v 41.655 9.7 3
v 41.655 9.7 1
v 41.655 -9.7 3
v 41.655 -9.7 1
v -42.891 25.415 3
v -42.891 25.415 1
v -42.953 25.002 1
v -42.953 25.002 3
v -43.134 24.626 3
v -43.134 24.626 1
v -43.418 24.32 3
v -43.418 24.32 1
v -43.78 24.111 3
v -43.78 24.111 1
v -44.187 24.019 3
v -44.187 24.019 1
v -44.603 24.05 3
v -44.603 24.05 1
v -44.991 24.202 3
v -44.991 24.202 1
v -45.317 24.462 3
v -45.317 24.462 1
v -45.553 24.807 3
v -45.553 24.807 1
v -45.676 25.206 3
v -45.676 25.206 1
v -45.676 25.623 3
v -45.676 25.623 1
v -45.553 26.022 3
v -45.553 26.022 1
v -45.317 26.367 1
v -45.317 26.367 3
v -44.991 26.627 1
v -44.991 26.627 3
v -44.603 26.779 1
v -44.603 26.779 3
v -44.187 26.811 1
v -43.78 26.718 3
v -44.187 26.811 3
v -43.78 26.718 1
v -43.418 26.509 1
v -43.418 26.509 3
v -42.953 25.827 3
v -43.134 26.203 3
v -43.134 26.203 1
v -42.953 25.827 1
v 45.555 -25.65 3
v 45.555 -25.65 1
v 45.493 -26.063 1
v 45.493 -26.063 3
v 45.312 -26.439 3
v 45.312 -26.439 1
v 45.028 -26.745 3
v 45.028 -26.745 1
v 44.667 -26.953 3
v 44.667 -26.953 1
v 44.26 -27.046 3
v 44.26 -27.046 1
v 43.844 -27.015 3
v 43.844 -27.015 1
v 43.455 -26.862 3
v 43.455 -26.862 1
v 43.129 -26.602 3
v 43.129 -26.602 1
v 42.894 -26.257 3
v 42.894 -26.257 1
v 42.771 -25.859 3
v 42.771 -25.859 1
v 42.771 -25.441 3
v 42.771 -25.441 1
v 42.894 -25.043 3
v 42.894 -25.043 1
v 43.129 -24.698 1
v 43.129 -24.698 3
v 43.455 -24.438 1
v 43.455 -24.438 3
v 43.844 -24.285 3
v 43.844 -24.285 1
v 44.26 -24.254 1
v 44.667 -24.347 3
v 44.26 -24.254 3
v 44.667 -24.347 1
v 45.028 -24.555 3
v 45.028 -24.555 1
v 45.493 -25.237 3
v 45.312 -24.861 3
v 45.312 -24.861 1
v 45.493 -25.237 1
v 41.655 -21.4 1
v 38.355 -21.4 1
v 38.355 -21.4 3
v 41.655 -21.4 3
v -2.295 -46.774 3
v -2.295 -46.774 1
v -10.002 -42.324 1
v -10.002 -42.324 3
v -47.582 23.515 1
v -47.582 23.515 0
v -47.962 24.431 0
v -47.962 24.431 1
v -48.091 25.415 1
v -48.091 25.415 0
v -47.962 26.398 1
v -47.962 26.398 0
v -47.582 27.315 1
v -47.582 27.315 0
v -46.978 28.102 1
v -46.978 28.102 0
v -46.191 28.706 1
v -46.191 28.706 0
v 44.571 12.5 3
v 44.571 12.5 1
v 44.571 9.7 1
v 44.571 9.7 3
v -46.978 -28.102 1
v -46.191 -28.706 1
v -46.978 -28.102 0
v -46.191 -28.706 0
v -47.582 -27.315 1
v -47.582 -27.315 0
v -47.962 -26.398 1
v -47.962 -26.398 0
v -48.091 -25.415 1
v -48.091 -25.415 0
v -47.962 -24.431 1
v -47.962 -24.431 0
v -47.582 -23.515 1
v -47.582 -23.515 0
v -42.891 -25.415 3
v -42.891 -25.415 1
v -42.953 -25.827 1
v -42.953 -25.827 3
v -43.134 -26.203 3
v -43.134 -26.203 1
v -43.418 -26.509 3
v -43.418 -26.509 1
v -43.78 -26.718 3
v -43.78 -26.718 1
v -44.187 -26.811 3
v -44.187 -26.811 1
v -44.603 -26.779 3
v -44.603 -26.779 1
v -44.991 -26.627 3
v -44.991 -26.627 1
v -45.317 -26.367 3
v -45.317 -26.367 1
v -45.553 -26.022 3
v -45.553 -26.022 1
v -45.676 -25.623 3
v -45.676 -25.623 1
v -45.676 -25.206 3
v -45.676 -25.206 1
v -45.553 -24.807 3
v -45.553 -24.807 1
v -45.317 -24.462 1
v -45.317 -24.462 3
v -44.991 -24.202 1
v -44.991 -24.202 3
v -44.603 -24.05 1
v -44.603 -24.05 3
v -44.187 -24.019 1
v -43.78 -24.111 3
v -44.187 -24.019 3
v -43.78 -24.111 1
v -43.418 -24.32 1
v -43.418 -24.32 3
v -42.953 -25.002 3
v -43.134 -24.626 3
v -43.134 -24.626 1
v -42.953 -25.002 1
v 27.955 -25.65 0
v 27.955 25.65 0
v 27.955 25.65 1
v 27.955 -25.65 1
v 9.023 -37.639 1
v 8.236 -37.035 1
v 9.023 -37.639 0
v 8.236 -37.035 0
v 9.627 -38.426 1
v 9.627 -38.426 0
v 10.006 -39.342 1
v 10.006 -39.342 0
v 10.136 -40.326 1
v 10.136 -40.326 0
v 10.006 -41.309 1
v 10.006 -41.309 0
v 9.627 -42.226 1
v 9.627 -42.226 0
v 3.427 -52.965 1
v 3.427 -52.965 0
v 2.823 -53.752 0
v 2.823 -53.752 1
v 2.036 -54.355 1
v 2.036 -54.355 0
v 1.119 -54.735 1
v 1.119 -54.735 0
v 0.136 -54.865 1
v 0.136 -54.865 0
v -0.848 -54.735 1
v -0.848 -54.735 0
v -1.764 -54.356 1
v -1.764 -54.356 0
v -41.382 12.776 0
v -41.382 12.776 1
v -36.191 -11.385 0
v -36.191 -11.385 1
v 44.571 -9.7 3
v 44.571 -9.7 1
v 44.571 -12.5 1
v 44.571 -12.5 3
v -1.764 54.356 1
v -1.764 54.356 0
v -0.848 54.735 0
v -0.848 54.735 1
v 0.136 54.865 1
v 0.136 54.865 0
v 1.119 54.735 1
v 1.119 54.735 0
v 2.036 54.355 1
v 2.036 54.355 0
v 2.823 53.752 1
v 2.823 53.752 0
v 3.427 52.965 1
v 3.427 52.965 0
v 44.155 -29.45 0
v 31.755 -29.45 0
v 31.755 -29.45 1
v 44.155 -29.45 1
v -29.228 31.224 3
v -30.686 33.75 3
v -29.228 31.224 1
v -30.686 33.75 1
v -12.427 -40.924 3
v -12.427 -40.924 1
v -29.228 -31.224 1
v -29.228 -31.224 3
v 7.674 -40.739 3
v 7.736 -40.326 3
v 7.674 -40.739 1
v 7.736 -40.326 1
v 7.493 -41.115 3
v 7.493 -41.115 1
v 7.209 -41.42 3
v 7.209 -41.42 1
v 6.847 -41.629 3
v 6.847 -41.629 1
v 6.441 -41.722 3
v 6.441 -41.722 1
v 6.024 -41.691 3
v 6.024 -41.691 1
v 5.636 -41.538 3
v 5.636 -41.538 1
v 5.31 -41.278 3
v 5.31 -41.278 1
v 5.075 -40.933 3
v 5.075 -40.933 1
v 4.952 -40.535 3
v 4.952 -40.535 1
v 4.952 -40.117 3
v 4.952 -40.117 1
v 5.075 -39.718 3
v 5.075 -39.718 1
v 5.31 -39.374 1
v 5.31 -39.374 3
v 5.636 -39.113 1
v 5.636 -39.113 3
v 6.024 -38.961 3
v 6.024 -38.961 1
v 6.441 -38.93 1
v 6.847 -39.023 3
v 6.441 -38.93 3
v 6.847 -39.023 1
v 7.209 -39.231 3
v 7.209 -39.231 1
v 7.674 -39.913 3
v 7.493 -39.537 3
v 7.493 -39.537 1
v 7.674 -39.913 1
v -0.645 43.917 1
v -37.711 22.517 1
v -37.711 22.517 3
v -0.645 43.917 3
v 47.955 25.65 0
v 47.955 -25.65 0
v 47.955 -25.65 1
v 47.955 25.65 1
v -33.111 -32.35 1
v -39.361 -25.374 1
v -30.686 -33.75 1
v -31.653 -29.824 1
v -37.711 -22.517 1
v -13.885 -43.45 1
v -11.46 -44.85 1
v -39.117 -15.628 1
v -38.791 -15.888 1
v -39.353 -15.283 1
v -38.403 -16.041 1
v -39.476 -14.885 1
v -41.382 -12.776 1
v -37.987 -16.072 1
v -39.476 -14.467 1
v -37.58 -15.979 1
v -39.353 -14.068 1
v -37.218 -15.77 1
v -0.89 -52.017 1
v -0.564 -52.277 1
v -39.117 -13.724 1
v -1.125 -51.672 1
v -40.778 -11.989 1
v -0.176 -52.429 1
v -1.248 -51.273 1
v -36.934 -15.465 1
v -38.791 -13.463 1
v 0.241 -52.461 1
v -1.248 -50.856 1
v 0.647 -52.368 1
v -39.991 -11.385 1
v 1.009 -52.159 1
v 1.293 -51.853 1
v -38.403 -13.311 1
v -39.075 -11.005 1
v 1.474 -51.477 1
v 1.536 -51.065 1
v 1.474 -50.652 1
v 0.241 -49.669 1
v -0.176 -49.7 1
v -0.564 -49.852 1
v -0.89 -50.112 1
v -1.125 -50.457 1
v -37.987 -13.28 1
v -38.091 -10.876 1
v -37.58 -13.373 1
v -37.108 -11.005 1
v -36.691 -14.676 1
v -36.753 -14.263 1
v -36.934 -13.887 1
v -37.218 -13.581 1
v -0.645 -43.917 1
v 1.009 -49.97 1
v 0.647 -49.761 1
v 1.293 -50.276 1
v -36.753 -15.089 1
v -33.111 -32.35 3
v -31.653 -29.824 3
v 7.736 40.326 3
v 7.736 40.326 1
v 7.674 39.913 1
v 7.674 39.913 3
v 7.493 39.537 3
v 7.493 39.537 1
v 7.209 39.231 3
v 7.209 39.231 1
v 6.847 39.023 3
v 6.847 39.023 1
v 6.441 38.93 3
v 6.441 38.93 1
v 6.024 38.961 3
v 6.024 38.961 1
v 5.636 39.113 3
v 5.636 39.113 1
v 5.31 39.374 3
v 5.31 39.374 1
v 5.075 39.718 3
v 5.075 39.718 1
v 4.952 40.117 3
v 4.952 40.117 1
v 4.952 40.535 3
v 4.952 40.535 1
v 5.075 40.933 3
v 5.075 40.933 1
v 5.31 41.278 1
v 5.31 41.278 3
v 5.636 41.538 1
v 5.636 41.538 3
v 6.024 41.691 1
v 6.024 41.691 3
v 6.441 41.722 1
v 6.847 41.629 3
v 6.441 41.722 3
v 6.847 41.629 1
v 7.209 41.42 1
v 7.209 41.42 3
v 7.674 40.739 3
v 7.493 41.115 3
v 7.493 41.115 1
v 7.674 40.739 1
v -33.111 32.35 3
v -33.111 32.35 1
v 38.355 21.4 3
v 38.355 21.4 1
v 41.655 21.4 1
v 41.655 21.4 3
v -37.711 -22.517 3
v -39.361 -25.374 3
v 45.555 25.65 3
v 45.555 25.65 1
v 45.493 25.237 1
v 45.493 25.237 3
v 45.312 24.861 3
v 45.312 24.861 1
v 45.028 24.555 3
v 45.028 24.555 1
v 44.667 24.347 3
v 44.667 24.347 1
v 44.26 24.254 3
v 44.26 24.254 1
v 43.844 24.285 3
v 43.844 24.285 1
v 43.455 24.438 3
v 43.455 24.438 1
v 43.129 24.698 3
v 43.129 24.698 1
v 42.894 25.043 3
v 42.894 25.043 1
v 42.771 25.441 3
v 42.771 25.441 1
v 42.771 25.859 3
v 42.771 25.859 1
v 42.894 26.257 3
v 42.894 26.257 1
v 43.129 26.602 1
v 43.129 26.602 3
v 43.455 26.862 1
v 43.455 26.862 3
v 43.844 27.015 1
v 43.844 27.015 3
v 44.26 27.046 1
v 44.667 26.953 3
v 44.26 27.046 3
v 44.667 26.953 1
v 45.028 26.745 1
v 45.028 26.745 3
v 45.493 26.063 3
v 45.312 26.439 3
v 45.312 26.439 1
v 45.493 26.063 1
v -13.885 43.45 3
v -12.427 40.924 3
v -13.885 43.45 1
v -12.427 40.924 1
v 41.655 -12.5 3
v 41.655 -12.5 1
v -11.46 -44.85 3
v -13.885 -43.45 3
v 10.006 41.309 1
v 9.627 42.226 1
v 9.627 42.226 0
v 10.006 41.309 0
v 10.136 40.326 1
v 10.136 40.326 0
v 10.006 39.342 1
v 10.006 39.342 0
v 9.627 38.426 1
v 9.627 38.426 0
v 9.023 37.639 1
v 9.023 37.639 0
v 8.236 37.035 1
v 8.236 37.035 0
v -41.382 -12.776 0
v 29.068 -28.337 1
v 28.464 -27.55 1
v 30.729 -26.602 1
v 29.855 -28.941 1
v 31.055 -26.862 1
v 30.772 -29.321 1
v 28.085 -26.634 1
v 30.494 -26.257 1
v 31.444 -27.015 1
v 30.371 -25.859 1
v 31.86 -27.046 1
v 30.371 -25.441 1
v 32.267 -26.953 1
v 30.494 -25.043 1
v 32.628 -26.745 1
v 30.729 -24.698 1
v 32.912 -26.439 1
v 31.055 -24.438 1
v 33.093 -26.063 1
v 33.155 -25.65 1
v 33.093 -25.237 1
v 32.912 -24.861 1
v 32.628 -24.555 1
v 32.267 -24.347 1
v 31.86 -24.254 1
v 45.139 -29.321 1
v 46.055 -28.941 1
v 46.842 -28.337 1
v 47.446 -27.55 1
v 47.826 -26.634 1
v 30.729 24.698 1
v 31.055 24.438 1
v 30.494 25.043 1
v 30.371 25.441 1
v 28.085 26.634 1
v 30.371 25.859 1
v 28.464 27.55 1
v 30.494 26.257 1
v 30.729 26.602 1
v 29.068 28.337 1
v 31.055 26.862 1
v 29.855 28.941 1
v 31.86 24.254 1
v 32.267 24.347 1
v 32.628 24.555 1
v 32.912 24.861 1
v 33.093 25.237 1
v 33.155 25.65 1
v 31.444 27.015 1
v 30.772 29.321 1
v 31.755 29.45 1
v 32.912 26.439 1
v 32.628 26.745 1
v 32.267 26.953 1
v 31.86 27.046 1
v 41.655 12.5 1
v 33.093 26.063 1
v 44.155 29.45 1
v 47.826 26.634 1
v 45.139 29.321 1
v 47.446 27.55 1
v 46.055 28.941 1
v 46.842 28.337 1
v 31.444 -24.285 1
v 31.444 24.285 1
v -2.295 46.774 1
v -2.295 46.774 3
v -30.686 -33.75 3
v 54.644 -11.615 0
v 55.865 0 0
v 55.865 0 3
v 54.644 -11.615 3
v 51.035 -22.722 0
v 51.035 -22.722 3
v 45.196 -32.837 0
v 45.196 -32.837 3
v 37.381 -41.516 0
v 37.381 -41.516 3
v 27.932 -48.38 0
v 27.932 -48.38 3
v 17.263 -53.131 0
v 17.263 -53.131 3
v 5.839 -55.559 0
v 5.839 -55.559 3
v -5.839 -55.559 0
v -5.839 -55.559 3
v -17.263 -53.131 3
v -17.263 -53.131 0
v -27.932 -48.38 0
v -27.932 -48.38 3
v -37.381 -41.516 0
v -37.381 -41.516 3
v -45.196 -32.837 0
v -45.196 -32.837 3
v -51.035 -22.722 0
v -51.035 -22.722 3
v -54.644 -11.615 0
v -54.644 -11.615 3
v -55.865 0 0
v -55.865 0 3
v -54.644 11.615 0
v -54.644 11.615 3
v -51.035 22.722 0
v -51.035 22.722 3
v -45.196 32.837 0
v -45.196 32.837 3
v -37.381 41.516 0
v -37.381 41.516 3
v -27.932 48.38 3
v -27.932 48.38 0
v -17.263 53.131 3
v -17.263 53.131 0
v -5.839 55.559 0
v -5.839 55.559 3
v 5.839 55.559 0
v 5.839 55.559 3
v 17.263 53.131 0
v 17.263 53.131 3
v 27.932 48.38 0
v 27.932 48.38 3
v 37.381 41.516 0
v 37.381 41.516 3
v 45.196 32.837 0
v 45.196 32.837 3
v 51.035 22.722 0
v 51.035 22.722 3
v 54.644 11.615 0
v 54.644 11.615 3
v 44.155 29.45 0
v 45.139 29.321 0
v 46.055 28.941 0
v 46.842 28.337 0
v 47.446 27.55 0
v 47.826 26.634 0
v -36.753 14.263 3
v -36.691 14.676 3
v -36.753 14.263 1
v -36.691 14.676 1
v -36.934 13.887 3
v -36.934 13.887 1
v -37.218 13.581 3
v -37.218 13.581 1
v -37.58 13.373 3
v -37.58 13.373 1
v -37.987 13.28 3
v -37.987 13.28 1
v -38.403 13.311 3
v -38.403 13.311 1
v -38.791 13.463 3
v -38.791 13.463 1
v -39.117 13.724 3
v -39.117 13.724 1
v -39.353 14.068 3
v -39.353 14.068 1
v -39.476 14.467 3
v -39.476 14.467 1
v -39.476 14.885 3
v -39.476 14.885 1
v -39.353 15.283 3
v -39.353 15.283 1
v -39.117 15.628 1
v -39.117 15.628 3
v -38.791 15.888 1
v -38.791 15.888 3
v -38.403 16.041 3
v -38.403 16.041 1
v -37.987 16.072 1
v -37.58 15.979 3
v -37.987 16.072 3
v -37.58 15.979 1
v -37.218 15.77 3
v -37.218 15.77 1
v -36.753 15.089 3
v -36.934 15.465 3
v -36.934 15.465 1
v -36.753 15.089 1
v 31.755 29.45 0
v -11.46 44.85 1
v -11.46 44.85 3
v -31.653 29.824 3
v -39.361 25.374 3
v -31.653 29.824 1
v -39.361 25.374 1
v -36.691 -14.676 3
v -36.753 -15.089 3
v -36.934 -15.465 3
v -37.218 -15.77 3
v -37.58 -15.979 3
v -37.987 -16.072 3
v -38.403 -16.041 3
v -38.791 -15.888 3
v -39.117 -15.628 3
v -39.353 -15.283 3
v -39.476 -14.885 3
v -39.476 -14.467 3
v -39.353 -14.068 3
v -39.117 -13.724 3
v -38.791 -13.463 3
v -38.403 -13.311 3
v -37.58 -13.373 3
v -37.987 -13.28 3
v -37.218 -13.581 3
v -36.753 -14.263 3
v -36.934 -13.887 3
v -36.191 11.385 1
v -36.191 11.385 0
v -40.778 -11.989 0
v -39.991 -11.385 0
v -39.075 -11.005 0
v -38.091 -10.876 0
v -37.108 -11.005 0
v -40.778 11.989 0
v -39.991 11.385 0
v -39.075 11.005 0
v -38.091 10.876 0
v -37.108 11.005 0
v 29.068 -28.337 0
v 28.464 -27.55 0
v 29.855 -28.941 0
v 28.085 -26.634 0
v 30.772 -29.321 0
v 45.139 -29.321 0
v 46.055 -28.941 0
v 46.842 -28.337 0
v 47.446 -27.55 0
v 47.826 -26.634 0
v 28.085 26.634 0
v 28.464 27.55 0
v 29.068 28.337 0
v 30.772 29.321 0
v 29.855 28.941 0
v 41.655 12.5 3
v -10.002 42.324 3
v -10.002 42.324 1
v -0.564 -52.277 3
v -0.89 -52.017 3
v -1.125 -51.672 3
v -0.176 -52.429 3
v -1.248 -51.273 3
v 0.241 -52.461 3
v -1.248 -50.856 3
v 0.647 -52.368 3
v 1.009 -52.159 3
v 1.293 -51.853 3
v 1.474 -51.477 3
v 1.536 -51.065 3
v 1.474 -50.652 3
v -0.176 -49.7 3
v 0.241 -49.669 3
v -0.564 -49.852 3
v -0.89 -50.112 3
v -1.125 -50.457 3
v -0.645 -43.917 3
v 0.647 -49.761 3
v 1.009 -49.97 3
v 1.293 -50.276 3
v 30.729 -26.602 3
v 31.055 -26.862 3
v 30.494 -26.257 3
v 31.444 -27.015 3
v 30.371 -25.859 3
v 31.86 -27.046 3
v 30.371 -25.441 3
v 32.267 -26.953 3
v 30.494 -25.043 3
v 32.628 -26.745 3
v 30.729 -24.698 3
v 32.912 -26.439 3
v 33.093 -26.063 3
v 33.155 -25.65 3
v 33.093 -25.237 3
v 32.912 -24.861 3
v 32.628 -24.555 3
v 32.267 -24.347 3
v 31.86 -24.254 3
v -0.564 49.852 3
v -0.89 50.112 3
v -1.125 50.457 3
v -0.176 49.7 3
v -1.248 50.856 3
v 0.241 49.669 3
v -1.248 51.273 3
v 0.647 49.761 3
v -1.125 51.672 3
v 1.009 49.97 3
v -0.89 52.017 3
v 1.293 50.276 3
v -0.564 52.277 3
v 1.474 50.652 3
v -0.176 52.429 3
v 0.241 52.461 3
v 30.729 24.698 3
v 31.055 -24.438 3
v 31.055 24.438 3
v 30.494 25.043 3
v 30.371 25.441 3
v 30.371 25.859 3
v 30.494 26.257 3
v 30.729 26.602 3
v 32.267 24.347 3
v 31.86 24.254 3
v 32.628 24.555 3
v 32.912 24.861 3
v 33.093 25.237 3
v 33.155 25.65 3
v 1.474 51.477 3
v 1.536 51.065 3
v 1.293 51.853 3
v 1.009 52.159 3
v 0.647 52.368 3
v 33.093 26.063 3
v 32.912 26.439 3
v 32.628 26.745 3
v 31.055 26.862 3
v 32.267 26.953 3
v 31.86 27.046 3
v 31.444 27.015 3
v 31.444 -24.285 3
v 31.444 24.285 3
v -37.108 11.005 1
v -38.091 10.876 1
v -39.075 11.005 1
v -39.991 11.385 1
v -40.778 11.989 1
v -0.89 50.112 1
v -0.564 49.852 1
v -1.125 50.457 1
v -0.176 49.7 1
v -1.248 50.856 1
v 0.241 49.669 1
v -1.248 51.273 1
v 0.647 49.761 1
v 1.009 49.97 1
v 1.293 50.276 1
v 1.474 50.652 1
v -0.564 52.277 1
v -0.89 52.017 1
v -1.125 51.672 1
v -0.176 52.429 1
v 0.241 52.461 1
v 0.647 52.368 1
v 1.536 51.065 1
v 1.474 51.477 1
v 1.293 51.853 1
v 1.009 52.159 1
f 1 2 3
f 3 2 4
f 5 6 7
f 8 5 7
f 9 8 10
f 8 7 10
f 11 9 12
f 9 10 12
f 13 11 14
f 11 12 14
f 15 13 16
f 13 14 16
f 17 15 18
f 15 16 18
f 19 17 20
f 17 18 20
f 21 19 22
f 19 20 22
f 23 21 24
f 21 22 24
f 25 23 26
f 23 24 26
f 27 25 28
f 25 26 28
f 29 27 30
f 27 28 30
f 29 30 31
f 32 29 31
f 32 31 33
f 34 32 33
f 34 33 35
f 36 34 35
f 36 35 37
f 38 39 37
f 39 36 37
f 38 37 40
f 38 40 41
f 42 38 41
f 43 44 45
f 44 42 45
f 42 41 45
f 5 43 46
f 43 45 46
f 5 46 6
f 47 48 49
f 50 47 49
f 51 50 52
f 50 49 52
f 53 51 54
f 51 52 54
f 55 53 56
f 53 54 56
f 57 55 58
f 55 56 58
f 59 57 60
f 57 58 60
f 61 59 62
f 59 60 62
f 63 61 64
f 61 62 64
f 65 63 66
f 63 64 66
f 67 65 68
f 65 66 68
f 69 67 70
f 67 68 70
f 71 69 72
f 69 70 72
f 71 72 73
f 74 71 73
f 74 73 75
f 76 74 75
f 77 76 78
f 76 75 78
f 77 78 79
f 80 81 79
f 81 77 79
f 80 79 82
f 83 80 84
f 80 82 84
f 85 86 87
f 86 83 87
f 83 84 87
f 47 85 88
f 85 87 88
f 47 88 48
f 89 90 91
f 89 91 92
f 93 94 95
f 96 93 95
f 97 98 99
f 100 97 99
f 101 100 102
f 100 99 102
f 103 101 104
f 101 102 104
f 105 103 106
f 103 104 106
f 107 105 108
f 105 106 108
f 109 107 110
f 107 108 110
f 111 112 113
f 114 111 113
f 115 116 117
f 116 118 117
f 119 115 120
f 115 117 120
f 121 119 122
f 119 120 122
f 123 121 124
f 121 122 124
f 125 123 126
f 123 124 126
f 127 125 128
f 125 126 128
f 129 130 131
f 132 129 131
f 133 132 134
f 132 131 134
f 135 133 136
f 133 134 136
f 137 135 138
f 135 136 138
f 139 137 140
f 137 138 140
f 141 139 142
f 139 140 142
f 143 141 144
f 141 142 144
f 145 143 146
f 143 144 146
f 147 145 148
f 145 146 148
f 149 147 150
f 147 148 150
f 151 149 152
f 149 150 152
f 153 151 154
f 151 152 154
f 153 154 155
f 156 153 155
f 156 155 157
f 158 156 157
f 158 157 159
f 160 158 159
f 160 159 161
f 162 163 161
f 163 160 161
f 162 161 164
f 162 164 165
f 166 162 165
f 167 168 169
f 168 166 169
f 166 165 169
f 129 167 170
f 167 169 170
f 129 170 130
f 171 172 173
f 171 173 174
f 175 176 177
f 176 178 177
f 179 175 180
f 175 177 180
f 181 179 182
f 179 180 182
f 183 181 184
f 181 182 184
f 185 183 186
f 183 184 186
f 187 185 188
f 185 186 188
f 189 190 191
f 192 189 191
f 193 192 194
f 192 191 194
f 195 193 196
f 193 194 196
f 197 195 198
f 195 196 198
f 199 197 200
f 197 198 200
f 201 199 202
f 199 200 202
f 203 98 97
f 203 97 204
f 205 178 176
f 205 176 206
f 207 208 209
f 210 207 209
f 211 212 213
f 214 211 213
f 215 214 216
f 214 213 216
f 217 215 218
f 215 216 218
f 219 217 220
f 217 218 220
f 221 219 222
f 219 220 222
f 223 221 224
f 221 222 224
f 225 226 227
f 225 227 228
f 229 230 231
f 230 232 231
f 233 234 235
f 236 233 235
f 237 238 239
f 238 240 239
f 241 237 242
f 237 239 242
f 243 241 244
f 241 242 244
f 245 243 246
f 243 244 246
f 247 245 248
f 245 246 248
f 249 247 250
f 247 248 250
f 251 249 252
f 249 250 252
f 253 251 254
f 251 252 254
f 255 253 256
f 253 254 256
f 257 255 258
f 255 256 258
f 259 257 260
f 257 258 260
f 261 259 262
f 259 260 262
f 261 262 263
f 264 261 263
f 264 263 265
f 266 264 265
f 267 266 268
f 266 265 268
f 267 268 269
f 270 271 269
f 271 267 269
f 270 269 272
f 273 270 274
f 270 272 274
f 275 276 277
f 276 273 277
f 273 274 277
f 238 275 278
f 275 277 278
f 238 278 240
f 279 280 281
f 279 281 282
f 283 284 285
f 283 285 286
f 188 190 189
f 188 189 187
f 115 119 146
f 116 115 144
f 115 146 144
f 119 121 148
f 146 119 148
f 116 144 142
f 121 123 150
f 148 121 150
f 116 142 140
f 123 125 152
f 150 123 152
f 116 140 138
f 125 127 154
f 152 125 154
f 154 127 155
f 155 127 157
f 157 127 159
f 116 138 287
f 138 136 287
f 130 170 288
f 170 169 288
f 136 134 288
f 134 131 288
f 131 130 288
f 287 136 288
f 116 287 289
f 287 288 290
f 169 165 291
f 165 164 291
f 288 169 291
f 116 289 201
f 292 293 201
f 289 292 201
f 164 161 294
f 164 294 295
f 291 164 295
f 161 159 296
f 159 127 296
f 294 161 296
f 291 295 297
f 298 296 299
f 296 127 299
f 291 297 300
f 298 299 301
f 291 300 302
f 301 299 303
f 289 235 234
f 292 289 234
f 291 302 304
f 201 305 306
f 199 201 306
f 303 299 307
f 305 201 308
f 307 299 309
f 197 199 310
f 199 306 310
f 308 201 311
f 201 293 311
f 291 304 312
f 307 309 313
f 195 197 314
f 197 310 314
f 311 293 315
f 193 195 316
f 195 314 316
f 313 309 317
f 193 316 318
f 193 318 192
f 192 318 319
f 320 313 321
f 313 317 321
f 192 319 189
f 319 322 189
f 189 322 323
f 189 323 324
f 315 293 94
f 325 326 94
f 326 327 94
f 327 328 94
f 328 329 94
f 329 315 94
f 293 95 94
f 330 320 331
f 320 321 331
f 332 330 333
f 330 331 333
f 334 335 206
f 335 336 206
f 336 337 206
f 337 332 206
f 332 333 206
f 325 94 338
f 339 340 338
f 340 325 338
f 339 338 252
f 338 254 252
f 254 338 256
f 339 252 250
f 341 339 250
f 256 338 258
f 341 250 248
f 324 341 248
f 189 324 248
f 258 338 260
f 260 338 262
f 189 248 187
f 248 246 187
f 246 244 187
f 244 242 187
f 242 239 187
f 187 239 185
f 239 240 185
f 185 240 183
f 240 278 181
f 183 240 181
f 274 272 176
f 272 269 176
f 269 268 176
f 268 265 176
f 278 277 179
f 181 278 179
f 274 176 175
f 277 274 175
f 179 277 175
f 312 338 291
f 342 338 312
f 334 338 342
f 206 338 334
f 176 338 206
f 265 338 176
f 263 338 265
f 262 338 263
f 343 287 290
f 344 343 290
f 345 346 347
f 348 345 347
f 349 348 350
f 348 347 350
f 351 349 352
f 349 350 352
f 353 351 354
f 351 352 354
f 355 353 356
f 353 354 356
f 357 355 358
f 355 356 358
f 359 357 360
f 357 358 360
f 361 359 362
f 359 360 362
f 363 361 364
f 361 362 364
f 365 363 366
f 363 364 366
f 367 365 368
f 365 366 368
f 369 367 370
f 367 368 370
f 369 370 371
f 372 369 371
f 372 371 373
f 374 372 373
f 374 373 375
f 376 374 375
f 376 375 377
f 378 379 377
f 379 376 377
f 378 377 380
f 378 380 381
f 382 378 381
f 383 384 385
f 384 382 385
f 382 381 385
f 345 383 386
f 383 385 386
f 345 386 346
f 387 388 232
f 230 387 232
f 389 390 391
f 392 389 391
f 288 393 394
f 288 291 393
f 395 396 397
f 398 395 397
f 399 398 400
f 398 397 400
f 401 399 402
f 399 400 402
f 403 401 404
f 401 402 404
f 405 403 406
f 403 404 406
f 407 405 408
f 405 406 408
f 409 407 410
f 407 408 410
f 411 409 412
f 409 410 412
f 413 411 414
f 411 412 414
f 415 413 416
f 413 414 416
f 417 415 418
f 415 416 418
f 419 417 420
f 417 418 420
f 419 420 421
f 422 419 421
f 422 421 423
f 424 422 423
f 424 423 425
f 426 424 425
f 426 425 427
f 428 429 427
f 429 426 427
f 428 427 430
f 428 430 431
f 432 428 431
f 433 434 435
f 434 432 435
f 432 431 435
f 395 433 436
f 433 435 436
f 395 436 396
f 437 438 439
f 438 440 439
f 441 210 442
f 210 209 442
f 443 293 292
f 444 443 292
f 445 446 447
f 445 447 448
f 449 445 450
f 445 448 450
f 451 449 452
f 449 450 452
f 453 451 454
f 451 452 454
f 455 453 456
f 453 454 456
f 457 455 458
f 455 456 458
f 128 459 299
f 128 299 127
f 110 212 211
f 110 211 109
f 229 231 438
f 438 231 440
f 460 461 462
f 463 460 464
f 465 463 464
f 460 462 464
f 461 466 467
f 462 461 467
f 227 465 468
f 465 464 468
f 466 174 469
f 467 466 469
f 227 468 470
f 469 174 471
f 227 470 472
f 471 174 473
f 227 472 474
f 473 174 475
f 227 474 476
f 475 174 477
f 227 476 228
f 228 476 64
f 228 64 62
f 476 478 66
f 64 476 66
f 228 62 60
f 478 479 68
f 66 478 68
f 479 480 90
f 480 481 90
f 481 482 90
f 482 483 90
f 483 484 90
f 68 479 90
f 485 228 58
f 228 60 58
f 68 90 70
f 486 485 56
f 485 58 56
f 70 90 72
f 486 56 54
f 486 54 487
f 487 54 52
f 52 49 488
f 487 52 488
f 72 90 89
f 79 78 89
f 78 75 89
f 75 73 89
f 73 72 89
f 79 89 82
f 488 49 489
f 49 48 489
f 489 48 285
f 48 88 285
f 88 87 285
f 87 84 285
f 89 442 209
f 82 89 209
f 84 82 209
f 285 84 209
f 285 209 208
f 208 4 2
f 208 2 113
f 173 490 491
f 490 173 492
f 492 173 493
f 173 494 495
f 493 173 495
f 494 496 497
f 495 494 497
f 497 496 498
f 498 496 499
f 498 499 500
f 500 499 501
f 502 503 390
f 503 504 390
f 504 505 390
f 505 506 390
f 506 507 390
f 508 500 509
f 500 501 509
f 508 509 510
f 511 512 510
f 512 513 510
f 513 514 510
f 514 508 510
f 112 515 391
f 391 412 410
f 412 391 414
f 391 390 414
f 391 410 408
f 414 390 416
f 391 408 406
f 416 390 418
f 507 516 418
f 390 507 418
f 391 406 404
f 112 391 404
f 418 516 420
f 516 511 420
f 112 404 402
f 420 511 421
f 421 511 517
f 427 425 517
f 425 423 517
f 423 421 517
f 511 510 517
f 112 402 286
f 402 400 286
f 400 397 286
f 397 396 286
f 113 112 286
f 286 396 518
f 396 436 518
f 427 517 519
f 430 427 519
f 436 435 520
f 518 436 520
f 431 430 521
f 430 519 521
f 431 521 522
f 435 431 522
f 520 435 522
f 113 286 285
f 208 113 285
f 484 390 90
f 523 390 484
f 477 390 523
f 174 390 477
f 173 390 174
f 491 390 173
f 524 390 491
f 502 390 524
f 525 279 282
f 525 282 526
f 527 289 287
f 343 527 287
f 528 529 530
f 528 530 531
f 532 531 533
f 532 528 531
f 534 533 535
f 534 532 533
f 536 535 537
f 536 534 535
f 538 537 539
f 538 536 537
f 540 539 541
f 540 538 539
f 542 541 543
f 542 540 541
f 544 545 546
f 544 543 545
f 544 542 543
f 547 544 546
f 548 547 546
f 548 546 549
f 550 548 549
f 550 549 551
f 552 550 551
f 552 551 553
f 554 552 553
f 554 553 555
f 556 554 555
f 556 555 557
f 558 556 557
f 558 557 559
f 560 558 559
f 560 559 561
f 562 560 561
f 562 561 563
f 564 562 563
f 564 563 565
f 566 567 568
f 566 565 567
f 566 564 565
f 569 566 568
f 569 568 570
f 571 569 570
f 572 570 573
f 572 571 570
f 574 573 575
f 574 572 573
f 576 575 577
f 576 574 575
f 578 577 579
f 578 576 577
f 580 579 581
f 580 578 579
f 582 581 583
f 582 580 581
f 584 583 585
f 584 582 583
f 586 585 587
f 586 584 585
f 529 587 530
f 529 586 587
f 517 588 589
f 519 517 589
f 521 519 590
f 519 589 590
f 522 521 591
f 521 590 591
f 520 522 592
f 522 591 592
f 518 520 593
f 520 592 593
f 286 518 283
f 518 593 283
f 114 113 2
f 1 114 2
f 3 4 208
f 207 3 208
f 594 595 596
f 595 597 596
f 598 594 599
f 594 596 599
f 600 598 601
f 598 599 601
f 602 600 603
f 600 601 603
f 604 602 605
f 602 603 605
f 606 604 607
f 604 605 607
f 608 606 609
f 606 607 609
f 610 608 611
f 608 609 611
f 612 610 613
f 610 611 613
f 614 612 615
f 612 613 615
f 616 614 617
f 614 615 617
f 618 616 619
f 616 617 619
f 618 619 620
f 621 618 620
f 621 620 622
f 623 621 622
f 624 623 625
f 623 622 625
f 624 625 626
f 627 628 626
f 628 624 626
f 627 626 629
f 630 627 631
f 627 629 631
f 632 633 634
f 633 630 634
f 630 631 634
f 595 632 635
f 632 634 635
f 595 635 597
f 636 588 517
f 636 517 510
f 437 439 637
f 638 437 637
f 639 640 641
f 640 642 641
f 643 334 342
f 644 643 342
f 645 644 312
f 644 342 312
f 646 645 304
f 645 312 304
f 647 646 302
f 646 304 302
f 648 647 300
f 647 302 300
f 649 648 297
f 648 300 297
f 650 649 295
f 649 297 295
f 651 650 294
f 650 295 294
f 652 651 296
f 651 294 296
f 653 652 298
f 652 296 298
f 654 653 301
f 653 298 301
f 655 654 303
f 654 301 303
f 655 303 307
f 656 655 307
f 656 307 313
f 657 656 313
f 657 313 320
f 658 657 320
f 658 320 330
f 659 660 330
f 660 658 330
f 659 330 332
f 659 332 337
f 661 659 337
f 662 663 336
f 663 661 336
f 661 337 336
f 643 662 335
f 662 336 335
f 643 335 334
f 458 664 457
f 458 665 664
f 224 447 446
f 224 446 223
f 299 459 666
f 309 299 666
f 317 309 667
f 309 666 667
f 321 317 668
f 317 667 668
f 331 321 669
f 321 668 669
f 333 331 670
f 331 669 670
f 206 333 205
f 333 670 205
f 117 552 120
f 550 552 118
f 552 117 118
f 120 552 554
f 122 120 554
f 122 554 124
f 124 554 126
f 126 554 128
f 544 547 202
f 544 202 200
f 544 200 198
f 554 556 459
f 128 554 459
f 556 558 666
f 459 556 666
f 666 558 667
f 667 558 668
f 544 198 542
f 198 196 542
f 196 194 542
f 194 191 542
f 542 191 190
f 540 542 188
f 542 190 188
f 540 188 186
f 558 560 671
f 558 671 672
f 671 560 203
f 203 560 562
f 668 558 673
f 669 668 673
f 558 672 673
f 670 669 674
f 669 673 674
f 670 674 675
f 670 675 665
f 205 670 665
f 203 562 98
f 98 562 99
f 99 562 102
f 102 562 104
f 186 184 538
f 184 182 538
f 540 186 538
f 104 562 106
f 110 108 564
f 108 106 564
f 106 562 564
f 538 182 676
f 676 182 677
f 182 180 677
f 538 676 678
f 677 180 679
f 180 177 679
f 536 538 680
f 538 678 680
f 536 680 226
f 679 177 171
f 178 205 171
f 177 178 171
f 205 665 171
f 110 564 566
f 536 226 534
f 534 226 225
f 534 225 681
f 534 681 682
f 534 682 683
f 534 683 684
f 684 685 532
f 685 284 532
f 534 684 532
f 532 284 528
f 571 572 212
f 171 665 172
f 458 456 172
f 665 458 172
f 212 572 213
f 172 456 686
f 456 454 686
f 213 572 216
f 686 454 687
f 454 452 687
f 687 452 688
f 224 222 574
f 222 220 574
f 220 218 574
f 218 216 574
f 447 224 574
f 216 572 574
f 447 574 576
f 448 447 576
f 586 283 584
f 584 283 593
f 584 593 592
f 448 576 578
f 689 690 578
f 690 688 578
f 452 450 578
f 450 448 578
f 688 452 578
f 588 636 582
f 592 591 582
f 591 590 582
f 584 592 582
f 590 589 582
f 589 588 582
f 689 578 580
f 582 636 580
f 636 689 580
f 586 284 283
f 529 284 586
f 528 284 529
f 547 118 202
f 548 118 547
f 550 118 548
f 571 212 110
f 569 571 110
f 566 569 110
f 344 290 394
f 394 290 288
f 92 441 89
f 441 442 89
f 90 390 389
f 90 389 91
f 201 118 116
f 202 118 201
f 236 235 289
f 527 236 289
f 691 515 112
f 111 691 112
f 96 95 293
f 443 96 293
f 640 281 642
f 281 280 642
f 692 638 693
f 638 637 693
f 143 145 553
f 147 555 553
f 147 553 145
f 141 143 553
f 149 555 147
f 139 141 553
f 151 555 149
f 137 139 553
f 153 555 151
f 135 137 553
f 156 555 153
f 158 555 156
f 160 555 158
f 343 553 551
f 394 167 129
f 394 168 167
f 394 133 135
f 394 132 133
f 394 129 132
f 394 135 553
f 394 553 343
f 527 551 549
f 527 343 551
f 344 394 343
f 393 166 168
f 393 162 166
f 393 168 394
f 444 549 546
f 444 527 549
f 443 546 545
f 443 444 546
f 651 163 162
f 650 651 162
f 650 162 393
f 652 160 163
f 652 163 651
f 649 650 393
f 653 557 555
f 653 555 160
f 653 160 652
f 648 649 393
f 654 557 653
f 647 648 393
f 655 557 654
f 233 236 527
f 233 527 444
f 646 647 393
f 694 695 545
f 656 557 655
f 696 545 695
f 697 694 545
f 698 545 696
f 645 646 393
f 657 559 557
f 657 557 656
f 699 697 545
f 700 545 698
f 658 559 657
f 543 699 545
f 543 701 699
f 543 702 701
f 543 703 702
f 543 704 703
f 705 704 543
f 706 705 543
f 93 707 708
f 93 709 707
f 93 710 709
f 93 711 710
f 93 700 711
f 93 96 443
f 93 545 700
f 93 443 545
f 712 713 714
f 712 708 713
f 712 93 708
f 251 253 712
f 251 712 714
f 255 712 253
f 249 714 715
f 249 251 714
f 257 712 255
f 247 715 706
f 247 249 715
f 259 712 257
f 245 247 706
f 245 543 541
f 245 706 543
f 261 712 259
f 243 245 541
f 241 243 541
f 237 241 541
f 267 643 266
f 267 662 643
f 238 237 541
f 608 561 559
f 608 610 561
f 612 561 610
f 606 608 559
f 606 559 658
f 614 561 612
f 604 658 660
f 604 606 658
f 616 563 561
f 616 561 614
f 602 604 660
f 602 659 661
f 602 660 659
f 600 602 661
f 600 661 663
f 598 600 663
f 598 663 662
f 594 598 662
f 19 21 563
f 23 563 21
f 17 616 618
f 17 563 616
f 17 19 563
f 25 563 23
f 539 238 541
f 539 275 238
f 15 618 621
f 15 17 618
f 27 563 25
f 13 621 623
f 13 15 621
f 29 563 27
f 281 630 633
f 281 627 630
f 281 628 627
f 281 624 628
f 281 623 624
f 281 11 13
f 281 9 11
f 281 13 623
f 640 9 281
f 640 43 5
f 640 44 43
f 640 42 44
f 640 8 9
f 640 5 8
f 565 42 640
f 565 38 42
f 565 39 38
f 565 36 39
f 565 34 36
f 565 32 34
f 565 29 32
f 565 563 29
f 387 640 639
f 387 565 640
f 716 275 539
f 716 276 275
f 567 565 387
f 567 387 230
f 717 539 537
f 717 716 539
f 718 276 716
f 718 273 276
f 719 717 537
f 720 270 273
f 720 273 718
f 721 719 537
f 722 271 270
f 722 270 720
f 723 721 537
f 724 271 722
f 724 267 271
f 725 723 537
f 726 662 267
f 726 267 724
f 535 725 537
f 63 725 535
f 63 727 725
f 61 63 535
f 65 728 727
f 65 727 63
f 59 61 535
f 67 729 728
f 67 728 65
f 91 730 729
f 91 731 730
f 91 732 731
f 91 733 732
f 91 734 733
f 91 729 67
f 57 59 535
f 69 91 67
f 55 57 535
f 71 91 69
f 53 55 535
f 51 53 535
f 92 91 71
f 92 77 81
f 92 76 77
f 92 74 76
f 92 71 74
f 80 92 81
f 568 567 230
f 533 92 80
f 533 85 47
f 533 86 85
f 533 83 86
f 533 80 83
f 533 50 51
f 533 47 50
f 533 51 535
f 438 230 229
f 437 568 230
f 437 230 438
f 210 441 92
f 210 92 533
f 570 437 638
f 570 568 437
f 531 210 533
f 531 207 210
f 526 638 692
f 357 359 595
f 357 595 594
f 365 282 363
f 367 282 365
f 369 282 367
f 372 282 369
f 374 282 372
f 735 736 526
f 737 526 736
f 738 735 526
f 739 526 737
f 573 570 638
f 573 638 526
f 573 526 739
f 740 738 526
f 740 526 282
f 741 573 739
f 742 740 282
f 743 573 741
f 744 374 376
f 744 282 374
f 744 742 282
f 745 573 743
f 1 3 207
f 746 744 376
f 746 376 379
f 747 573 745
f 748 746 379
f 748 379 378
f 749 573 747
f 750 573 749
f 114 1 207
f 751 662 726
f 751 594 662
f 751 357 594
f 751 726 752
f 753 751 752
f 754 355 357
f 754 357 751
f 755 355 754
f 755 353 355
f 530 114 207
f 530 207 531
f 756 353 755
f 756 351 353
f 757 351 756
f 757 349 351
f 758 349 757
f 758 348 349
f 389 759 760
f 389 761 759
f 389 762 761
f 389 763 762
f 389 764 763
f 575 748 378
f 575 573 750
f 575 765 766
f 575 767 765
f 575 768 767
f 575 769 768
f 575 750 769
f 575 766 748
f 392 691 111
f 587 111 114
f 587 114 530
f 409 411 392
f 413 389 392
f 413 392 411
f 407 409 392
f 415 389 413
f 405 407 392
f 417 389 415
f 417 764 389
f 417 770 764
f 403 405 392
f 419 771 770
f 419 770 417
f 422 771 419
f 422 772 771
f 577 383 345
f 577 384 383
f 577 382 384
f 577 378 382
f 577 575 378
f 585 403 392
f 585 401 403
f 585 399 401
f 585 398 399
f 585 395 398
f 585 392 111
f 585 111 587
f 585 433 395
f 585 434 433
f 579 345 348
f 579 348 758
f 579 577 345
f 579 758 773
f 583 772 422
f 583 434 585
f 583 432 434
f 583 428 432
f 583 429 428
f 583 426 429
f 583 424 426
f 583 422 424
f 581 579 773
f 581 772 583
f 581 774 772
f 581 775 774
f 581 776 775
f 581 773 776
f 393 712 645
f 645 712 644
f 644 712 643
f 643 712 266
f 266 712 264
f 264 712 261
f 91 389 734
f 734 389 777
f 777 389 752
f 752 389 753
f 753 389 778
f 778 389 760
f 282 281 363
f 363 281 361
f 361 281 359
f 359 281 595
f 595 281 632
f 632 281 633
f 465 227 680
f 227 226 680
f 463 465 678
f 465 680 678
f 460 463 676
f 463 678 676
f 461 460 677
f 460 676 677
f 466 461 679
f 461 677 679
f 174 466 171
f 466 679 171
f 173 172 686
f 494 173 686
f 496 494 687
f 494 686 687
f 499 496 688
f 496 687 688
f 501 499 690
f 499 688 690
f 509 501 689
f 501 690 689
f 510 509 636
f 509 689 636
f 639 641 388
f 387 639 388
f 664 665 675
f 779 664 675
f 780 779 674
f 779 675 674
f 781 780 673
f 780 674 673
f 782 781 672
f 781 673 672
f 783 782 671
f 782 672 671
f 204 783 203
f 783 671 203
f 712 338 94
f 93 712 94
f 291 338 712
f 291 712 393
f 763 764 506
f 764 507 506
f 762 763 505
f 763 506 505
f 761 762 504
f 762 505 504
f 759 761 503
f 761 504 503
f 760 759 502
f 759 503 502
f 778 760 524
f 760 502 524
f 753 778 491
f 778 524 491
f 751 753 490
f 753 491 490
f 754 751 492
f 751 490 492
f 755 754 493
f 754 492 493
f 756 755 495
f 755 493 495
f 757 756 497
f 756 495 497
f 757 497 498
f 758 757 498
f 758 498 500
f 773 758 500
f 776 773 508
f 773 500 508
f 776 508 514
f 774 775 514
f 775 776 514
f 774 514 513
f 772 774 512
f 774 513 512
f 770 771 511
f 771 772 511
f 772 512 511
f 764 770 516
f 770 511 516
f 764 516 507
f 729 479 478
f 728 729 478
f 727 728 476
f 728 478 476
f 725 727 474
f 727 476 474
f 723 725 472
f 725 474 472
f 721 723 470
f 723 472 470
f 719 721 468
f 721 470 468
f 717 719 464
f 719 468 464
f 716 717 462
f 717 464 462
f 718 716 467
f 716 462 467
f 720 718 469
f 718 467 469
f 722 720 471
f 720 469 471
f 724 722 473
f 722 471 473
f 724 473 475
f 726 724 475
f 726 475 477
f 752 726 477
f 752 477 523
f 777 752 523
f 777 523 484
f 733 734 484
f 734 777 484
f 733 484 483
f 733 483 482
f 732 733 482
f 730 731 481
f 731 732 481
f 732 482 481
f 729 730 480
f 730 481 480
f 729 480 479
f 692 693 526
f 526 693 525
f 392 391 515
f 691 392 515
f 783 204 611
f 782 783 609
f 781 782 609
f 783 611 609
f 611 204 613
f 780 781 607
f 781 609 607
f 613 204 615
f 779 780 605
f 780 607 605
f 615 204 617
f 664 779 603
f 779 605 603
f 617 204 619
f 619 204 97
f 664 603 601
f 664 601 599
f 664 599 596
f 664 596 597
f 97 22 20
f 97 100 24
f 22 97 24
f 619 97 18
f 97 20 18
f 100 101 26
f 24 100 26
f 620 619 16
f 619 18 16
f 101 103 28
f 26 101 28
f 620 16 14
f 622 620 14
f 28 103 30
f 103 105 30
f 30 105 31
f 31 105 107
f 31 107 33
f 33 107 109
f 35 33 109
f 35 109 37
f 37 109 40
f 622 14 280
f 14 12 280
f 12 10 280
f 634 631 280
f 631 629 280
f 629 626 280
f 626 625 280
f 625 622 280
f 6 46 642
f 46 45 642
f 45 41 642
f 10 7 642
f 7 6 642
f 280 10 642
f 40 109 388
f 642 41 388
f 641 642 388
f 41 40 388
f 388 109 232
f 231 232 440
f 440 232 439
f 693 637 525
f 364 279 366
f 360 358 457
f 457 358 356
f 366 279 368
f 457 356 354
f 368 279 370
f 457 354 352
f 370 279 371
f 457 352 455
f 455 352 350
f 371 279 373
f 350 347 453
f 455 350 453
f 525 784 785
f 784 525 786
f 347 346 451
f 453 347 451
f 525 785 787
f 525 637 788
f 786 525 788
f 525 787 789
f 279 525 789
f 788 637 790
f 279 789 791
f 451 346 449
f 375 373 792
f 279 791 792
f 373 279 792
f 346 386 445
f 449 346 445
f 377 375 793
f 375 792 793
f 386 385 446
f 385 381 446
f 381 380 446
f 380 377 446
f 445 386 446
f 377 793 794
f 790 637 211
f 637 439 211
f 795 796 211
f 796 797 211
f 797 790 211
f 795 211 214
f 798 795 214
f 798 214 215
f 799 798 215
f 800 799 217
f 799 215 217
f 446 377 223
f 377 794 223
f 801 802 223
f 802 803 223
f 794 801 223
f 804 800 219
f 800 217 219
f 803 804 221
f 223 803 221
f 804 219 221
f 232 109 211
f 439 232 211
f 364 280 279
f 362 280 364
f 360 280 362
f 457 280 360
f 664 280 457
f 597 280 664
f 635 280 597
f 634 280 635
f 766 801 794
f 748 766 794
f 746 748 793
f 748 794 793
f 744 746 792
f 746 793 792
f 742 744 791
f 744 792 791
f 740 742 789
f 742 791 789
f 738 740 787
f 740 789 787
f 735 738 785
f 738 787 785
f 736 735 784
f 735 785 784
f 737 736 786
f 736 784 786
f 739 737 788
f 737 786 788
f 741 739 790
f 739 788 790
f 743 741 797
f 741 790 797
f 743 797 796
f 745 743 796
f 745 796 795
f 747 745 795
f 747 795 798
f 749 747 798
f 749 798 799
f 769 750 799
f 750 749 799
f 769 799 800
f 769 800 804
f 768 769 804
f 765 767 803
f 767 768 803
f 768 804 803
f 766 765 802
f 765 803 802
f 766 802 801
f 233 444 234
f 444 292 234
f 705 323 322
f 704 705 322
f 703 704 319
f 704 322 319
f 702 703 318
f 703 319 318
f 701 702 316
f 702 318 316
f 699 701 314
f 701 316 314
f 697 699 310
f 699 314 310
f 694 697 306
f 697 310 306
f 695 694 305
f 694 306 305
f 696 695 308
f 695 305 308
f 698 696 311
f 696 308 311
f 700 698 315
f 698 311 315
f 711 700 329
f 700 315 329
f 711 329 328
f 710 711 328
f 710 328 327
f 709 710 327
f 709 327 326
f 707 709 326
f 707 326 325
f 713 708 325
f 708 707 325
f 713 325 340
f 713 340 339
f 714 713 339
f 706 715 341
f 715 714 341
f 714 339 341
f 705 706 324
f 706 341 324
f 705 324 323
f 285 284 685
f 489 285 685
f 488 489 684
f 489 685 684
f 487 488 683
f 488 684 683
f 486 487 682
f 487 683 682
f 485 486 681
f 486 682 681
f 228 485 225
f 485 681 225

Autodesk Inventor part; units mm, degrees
ref_plane "YZ Plane" through (0, 0, 0) normal (1, 0, 0) x (0, 1, 0)
ref_plane "XZ Plane" through (0, 0, 0) normal (0, 1, 0) x (-1, 0, 0)
ref_plane "XY Plane" through (0, 0, 0) normal (0, 0, 1) x (1, 0, 0)
sketch "Skizze1" plane through (0, 0, 0) normal (0, 0, 1) x (1, 0, 0)
  line L0 (0, 78.2107) -> (0, -78.2107) construction
  line L1 (-128.6657, 0) -> (86.6199, 0) construction
  line L2 (31.7553, 29.05) -> (44.1553, 29.05) construction
  line L3 (47.5553, 25.65) -> (47.5553, -25.65) construction
  line L4 (44.1553, -29.05) -> (31.7553, -29.05) construction
  line L5 (28.3553, -25.65) -> (28.3553, 25.65) construction
  arc A0 (31.7553, 29.05) -> (28.3553, 25.65) centre (31.7553, 25.65) ccw construction
  arc A1 (47.5553, 25.65) -> (44.1553, 29.05) centre (44.1553, 25.65) ccw construction
  arc A2 (44.1553, -29.05) -> (47.5553, -25.65) centre (44.1553, -25.65) ccw construction
  arc A3 (28.3553, -25.65) -> (31.7553, -29.05) centre (31.7553, -25.65) ccw construction
  circle A4 centre (31.7553, 25.65) radius 1.4
  circle A5 centre (44.1553, 25.65) radius 1.4
  circle A6 centre (31.7553, -25.65) radius 1.4
  circle A7 centre (44.1553, -25.65) radius 1.4
  line L6 (41.6553, 21.4) -> (41.6553, -21.4)
  line L7 (38.3553, 21.4) -> (38.3553, -21.4)
  line L8 (38.3553, 21.4) -> (41.6553, 21.4)
  line L9 (38.3553, -21.4) -> (41.6553, -21.4)
  line L10 (38.3553, 0.8) -> (41.6553, 0.8)
  line L11 (38.3553, -0.8) -> (41.6553, -0.8)
  line L12 (41.6553, 12.5) -> (44.5713, 12.5)
  line L13 (44.5713, 12.5) -> (44.5713, 9.7)
  line L14 (44.5713, 9.7) -> (41.6553, 9.7)
  line L15 (41.6553, -9.7) -> (44.5713, -9.7)
  line L16 (44.5713, -9.7) -> (44.5713, -12.5)
  line L17 (44.5713, -12.5) -> (41.6553, -12.5)
  line L18 (44.1553, 29.45) -> (31.7553, 29.45)
  arc A8 (31.7553, 29.45) -> (27.9553, 25.65) centre (31.7553, 25.65) ccw
  line L19 (27.9553, 25.65) -> (27.9553, -25.65)
  arc A9 (27.9553, -25.65) -> (31.7553, -29.45) centre (31.7553, -25.65) ccw
  line L20 (31.7553, -29.45) -> (44.1553, -29.45)
  arc A10 (44.1553, -29.45) -> (47.9553, -25.65) centre (44.1553, -25.65) ccw
  line L21 (47.9553, -25.65) -> (47.9553, 25.65)
  arc A11 (47.9553, 25.65) -> (44.1553, 29.45) centre (44.1553, 25.65) ccw
  line L22 (25.9072, -29.1198) -> (28.4872, -27.589) construction
  line L23 (-0.6447, 43.9167) -> (-2.2947, 46.7745)
  circle A12 centre (0.1359, 51.0646) radius 1.4
  arc A13 (3.0804, 52.7646) -> (-1.5641, 54.0091) centre (0.1359, 51.0646) ccw construction
  arc A14 (3.4268, 52.9646) -> (-1.7641, 54.3555) centre (0.1359, 51.0646) ccw
  circle A15 centre (6.3359, 40.3259) radius 1.4
  line L24 (12.2649, 36.9962) -> (9.6492, 38.4652) construction
  arc A16 (8.0359, 37.3814) -> (9.2804, 42.0259) centre (6.3359, 40.3259) ccw construction
  arc A17 (8.2359, 37.035) -> (9.6268, 42.2259) centre (6.3359, 40.3259) ccw
  line L25 (9.6268, 42.2259) -> (3.4268, 52.9646)
  line L26 (3.0804, 52.7646) -> (9.2804, 42.0259) construction
  line L27 (-41.0357, 12.9759) -> (-47.2357, 23.7146) construction
  arc A18 (-41.0357, 12.9759) -> (-36.3912, 11.7314) centre (-38.0912, 14.6759) ccw construction
  circle A19 centre (-38.0912, 14.6759) radius 1.4
  circle A20 centre (-44.2912, 25.4146) radius 1.4
  arc A21 (-41.3821, 12.7759) -> (-36.1912, 11.385) centre (-38.0912, 14.6759) ccw
  line L28 (-47.5821, 23.5146) -> (-41.3821, 12.7759)
  arc A22 (-45.9912, 28.3591) -> (-47.2357, 23.7146) centre (-44.2912, 25.4146) ccw construction
  arc A23 (-46.1912, 28.7055) -> (-47.5821, 23.5146) centre (-44.2912, 25.4146) ccw
  line L29 (-11.4603, 44.8499) -> (-10.0023, 42.3245)
  line L30 (-13.8852, 43.4499) -> (-11.4603, 44.8499)
  line L31 (-12.4272, 40.9245) -> (-13.8852, 43.4499)
  line L32 (-37.7106, 22.5167) -> (-39.3606, 25.3745)
  line L33 (-31.653, 29.8245) -> (-33.111, 32.3499)
  line L34 (-33.111, 32.3499) -> (-30.6861, 33.7499)
  line L35 (-30.6861, 33.7499) -> (-29.2281, 31.2245)
  line L36 (-19.8705, 32.8167) -> (-21.5205, 35.6745)
  line L37 (-18.4848, 33.6167) -> (-20.1348, 36.4745)
  line L38 (-39.3606, 25.3745) -> (-2.2947, 46.7745)
  line L39 (-1.7641, 54.3555) -> (-46.1912, 28.7055)
  line L40 (-45.9912, 28.3591) -> (-1.5641, 54.0091) construction
  line L41 (8.0359, 37.3814) -> (-36.3912, 11.7314) construction
  line L42 (-36.1912, 11.385) -> (8.2359, 37.035)
  line L43 (-37.7106, 22.5167) -> (-0.6447, 43.9167)
  line L44 (-37.7106, -22.5167) -> (-39.3606, -25.3745)
  circle A24 centre (-44.2912, -25.4146) radius 1.4
  arc A25 (-47.2357, -23.7146) -> (-45.9912, -28.3591) centre (-44.2912, -25.4146) ccw construction
  arc A26 (-47.5821, -23.5146) -> (-46.1912, -28.7055) centre (-44.2912, -25.4146) ccw
  circle A27 centre (-38.0912, -14.6759) radius 1.4
  line L45 (-38.1721, -7.8764) -> (-38.1364, -10.8762) construction
  arc A28 (-36.3912, -11.7314) -> (-41.0357, -12.9759) centre (-38.0912, -14.6759) ccw construction
  arc A29 (-36.1912, -11.385) -> (-41.3821, -12.7759) centre (-38.0912, -14.6759) ccw
  line L46 (-41.3821, -12.7759) -> (-47.5821, -23.5146)
  line L47 (-47.2357, -23.7146) -> (-41.0357, -12.9759) construction
  line L48 (9.2804, -42.0259) -> (3.0804, -52.7646) construction
  arc A30 (9.2804, -42.0259) -> (8.0359, -37.3814) centre (6.3359, -40.3259) ccw construction
  circle A31 centre (6.3359, -40.3259) radius 1.4
  circle A32 centre (0.1359, -51.0646) radius 1.4
  arc A33 (9.6268, -42.2259) -> (8.2359, -37.035) centre (6.3359, -40.3259) ccw
  line L49 (3.4268, -52.9646) -> (9.6268, -42.2259)
  arc A34 (-1.5641, -54.0091) -> (3.0804, -52.7646) centre (0.1359, -51.0646) ccw construction
  arc A35 (-1.7641, -54.3555) -> (3.4268, -52.9646) centre (0.1359, -51.0646) ccw
  line L50 (-33.111, -32.3499) -> (-31.653, -29.8245)
  line L51 (-30.6861, -33.7499) -> (-33.111, -32.3499)
  line L52 (-29.2281, -31.2245) -> (-30.6861, -33.7499)
  line L53 (-0.6447, -43.9167) -> (-2.2947, -46.7745)
  line L54 (-10.0023, -42.3245) -> (-11.4603, -44.8499)
  line L55 (-11.4603, -44.8499) -> (-13.8852, -43.4499)
  line L56 (-13.8852, -43.4499) -> (-12.4272, -40.9245)
  line L57 (-18.4848, -33.6167) -> (-20.1348, -36.4745)
  line L58 (-19.8705, -32.8167) -> (-21.5205, -35.6745)
  line L59 (-2.2947, -46.7745) -> (-39.3606, -25.3745)
  line L60 (-46.1912, -28.7055) -> (-1.7641, -54.3555)
  line L61 (-1.5641, -54.0091) -> (-45.9912, -28.3591) construction
  line L62 (-36.3912, -11.7314) -> (8.0359, -37.3814) construction
  line L63 (8.2359, -37.035) -> (-36.1912, -11.385)
  line L64 (-0.6447, -43.9167) -> (-37.7106, -22.5167)
  line L65 (-31.8985, 33.0499) -> (-43.6029, 53.3224) construction
  line L66 (-34.0905, 36.8465) -> (-97.9106, 0) construction
  line L67 (-31.8985, -33.0499) -> (-43.7977, -53.6598) construction
  line L68 (-34.0905, -36.8465) -> (-97.9106, 0) construction
  circle A36 centre (0, 0) radius 55.8648
  line L69 (-48.4545, 27.8035) -> (-47.5871, 27.3058) construction
  line L70 (-42.3106, 30.4841) -> (-24.7106, 0) construction
  dimension "d1" = 58.1
  dimension "d2" = 19.2
  dimension "d3" = 3.4
  dimension "d5" = 2.8
  dimension "d6" = 5.9
  dimension "d7" = 3.3
  dimension "d8" = 20.6
  dimension "d9" = 1.6
  dimension "d10" = 2.984
  dimension "d11" = 2.8
  dimension "d12" = 19.4
  dimension "d21" = 0.4
  dimension "d22" = 3
  dimension "d32" = 360
  dimension "d44" = 1
  dimension "d45" = 1
  dimension "d47" = 1
  dimension "d53" = 35.2
extrude "Extrusion5" add sketch "Skizze1" along normal blind 3 contours A11 L21 A10 L20 A9 L19 A8 L18 | L25 A17 L42 A21 L28 A23 L39 A14 | L46 A29 L63 A33 L49 A35 L60 A26 | A36
extrude "Extrusion4" cut sketch "Skizze1" along normal blind 1 contours L10 L6 L11 L7 | A11 L21 A10 L20 A9 L19 A8 L18 | L43 L36 L38 L37 | L25 A17 L42 A21 L28 A23 L39 A14 | L64 L57 L59 L58 | L46 A29 L63 A33 L49 A35 L60 A26
equation "\"d22\" = d20"
equation "\"d20\" = 3"
properties part number "Stewart-Platform-Base-Innenanordnung"
